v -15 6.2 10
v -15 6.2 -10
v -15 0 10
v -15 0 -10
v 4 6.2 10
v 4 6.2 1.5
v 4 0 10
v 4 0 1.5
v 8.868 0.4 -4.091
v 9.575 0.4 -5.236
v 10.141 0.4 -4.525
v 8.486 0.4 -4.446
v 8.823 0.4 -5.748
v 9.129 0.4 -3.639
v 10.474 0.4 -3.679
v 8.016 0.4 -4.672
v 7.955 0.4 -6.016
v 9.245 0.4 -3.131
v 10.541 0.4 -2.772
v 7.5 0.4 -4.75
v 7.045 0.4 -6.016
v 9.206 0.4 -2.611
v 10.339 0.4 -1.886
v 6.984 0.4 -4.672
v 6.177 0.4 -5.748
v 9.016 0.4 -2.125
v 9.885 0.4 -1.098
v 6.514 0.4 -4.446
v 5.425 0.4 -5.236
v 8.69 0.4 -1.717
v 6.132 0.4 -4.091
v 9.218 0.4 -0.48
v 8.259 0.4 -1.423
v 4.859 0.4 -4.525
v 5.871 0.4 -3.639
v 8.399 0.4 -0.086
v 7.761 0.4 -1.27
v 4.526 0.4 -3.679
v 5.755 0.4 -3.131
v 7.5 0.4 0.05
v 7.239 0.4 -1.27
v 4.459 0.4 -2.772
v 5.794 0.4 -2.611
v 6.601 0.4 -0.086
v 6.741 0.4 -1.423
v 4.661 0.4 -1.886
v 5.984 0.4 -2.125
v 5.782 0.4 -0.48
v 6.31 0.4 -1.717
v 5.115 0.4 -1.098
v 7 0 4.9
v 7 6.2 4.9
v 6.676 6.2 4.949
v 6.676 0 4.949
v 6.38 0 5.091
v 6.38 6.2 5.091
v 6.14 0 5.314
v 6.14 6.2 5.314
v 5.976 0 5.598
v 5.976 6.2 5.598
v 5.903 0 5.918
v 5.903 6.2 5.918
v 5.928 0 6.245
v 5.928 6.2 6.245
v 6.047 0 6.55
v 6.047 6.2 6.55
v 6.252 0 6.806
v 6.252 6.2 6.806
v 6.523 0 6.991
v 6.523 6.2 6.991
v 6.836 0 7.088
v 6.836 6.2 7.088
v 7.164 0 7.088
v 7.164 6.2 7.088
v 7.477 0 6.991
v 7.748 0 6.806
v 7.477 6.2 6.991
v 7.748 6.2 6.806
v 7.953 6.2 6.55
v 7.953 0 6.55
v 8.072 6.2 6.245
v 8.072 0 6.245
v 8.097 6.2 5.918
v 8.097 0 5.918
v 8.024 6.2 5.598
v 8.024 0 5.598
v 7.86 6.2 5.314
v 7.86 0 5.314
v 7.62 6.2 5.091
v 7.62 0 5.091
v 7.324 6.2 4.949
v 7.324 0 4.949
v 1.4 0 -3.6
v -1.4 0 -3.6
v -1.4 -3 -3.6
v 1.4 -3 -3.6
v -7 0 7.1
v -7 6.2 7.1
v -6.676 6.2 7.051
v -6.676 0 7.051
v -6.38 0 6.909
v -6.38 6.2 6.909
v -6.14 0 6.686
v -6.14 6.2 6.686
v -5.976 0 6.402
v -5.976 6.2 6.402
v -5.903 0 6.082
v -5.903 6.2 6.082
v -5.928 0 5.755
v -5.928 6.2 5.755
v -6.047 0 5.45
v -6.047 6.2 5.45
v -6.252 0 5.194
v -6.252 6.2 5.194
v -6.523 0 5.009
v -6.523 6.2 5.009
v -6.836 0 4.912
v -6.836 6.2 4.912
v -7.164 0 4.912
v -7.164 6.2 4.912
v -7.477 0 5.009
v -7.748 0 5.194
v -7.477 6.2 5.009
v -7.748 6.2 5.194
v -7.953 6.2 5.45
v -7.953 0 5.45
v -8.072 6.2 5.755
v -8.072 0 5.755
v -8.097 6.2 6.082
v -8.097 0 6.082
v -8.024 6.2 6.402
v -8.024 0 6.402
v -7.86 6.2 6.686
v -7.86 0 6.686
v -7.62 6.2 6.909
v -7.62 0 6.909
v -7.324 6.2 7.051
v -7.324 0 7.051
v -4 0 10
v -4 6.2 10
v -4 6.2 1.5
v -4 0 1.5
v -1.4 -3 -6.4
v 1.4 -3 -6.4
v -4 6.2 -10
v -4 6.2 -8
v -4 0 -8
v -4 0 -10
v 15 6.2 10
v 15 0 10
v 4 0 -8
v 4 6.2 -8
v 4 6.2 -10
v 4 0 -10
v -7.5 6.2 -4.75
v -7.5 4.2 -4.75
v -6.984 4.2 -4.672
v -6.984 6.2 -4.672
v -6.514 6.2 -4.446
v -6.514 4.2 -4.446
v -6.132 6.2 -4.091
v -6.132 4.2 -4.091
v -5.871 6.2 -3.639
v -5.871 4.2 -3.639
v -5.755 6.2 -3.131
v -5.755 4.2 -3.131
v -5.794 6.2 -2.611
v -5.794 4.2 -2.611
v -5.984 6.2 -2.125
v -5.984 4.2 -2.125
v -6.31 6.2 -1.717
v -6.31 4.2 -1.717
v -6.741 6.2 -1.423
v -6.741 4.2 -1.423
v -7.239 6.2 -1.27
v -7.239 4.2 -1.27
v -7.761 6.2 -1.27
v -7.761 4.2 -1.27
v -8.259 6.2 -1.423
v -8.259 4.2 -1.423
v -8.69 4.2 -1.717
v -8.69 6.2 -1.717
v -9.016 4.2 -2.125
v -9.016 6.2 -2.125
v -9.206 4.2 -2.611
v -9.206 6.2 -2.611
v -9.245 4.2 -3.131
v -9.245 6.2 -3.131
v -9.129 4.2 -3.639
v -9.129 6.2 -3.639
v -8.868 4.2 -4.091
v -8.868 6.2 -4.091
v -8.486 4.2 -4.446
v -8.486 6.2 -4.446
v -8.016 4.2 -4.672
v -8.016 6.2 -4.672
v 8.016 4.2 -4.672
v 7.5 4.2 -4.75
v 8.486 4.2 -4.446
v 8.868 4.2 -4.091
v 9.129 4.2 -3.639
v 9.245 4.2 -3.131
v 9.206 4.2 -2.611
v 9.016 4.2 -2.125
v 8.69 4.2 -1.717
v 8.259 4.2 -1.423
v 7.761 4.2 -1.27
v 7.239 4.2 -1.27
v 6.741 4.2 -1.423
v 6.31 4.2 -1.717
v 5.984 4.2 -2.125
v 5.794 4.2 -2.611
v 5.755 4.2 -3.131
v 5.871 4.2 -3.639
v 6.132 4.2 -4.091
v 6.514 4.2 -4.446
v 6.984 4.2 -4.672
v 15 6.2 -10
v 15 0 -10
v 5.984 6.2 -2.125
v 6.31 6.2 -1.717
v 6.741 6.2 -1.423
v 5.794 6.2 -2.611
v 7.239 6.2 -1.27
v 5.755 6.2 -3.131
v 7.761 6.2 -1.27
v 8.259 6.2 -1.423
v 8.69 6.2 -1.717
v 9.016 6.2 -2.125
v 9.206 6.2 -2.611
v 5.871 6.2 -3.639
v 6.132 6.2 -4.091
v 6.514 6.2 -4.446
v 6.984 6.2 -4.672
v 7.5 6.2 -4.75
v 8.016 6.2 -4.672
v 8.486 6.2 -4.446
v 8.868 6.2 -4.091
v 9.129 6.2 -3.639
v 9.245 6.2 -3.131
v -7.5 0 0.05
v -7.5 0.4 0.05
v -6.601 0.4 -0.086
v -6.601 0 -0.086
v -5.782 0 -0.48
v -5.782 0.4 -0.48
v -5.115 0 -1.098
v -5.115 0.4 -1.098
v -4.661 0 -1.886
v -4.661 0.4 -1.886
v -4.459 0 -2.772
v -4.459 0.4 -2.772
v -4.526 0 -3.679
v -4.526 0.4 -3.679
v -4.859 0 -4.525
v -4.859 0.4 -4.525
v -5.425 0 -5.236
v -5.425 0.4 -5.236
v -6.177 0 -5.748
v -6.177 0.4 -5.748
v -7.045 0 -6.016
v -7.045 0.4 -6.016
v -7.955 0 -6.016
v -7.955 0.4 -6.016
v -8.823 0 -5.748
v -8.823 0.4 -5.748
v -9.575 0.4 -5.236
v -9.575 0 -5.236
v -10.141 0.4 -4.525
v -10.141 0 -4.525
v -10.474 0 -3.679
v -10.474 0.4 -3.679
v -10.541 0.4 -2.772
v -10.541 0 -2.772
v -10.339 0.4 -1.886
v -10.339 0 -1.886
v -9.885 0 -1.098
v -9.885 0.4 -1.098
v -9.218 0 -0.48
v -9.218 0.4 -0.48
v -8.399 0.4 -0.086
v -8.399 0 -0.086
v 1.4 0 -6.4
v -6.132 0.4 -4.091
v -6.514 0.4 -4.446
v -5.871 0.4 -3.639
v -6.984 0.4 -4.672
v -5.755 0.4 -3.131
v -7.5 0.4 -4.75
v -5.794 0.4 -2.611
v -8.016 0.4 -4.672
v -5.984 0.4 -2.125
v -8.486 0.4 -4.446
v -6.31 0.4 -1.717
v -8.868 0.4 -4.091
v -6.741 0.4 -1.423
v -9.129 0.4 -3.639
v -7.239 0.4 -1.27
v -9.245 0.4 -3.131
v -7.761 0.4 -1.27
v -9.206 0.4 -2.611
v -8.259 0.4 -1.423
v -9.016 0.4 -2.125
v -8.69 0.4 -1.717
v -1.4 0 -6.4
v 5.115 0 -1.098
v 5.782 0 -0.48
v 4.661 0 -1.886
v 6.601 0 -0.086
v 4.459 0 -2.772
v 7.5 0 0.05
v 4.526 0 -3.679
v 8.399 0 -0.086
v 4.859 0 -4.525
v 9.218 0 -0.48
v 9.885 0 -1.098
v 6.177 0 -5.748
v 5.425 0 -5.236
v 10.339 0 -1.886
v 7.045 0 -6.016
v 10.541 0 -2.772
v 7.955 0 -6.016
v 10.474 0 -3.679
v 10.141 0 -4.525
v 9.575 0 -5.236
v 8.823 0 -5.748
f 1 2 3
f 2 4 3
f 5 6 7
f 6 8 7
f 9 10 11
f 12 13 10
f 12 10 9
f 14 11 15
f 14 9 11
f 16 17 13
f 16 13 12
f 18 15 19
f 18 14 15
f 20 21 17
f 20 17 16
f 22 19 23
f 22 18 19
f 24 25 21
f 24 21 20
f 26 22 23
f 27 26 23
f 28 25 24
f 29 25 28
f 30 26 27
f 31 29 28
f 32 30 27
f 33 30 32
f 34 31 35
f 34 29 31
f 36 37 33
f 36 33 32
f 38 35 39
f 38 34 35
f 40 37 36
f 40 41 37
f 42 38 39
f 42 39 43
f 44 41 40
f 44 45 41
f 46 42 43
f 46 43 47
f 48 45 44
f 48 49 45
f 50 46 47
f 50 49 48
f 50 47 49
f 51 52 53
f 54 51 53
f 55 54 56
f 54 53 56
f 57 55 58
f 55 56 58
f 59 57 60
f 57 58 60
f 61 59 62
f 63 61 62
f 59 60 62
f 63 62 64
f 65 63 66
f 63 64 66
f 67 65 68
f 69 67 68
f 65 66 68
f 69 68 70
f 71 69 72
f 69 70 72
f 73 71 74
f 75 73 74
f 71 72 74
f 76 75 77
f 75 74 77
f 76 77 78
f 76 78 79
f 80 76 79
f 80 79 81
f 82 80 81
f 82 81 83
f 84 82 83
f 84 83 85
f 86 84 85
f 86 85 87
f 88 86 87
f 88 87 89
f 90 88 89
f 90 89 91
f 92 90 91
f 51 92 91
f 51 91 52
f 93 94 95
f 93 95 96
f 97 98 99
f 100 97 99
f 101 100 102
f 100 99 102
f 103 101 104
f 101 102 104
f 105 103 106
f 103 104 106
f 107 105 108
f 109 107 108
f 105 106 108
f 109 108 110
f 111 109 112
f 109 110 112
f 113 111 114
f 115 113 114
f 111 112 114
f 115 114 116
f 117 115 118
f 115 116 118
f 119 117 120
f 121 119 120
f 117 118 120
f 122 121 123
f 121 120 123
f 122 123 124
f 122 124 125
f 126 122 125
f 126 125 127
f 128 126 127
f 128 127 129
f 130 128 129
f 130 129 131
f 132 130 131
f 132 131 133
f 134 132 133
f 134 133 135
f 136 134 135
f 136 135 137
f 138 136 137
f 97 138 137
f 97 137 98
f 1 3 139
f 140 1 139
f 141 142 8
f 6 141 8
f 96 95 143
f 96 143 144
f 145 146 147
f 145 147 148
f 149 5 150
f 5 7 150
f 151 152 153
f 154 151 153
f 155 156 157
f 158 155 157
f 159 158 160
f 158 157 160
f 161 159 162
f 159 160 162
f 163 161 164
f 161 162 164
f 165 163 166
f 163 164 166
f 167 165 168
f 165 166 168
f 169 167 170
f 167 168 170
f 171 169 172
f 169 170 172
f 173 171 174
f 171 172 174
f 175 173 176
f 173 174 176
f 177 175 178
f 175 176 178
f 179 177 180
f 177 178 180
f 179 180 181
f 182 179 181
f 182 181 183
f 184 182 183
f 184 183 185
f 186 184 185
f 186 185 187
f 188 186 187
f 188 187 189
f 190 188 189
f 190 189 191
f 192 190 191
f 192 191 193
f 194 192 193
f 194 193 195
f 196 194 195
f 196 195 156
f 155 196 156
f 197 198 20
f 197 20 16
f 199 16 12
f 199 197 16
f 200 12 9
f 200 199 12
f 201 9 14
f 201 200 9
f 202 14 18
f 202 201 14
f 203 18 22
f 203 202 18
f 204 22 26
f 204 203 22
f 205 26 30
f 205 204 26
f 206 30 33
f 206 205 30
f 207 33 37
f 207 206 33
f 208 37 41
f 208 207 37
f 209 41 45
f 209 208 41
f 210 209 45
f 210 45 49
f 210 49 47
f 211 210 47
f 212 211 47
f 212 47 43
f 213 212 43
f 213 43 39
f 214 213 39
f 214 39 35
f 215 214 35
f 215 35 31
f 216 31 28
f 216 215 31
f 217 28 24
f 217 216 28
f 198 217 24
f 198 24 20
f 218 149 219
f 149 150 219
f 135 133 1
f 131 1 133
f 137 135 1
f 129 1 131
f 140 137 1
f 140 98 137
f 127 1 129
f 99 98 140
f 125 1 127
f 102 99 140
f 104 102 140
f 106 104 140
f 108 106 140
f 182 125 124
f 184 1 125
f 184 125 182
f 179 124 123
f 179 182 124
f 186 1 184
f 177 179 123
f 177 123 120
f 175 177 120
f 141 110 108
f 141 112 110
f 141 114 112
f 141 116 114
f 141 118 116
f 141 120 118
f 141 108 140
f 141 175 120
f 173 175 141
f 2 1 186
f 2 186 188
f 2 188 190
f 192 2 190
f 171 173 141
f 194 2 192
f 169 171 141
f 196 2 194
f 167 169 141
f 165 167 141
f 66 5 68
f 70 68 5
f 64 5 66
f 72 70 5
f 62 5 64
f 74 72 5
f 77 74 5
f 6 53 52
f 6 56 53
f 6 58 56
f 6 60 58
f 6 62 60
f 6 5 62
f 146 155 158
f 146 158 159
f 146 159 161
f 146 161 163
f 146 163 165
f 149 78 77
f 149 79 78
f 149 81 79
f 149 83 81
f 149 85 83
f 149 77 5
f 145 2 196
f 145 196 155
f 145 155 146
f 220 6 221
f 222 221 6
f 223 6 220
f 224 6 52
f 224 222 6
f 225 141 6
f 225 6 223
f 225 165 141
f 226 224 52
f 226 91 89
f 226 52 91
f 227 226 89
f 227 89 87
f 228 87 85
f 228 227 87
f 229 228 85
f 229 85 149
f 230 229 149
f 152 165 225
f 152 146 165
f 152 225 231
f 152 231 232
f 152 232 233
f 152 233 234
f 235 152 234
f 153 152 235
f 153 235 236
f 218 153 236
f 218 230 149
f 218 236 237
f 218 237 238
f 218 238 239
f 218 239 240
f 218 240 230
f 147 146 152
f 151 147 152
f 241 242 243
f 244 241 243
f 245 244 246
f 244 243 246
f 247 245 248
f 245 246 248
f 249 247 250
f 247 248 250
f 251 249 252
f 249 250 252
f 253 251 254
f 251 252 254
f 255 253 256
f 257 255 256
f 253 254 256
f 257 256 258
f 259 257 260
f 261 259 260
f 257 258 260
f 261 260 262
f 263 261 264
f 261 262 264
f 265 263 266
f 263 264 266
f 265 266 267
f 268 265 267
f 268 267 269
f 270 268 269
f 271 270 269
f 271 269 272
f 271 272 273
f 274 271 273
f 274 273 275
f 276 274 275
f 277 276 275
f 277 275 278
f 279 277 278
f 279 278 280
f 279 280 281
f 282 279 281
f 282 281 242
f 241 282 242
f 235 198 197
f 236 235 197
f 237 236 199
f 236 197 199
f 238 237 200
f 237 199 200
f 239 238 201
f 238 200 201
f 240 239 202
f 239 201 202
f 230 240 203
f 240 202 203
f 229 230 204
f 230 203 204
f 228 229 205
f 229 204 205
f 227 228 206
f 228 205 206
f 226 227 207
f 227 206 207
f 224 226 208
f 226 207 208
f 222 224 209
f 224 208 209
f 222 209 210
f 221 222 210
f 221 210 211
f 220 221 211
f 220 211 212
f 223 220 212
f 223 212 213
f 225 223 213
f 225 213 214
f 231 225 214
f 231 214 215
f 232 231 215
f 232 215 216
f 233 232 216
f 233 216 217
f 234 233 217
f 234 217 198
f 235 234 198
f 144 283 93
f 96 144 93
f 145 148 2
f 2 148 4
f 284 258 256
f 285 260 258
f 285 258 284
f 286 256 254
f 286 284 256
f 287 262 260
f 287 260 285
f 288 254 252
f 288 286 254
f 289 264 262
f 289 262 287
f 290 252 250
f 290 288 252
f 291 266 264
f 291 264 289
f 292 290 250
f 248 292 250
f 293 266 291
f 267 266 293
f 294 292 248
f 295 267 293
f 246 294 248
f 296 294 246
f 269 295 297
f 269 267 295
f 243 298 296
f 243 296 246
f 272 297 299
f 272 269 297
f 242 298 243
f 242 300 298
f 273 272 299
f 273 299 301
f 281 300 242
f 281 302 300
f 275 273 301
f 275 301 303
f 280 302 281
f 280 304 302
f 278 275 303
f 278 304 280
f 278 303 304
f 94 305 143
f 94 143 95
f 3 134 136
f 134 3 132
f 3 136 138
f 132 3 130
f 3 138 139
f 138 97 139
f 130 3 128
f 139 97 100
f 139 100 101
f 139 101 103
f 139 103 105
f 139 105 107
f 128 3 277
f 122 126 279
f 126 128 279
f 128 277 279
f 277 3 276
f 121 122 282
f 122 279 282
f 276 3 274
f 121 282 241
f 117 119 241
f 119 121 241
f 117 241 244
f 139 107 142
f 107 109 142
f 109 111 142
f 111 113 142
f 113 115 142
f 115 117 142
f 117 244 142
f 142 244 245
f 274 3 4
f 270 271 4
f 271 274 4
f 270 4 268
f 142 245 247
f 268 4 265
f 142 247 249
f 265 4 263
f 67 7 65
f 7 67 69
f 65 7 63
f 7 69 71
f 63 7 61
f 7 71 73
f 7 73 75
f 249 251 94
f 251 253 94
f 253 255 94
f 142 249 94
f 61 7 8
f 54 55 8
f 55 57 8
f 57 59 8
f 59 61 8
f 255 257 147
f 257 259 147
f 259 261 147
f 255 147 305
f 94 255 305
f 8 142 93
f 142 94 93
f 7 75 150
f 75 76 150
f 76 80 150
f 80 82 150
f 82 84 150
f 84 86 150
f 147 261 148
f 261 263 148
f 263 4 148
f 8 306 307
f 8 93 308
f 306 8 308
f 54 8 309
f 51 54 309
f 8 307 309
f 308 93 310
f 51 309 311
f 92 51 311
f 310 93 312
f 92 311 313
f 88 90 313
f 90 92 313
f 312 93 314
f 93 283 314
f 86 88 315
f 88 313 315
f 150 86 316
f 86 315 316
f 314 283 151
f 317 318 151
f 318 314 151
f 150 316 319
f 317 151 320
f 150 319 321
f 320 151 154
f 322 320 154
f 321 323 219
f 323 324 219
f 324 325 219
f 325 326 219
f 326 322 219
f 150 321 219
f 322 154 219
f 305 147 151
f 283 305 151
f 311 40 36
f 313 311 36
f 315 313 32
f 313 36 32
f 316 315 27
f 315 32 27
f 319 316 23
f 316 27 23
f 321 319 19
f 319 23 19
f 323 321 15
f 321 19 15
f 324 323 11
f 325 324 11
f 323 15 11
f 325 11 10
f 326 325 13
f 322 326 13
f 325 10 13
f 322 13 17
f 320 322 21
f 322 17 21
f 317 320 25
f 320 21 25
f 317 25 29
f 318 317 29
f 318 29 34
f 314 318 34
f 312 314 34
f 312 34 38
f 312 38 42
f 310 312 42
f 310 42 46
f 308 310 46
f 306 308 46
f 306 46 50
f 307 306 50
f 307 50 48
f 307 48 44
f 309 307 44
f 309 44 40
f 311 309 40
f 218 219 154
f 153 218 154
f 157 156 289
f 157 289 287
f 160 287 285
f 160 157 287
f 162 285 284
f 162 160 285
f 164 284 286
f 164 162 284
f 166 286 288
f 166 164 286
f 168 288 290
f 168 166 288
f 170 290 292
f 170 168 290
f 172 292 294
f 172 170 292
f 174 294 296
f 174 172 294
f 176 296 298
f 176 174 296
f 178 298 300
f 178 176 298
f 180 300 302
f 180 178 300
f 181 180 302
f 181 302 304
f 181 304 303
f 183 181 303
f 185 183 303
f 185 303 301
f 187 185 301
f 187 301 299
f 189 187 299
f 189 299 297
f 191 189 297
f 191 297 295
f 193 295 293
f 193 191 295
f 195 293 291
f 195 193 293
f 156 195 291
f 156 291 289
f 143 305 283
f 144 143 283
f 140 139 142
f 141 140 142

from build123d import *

# Parameters (mm, degrees)
SKETCH_1_W          = 30
SKETCH_1_H          = 20
EXTRUDE_1_DEPTH     = 4.2
SKETCH_2_R          = 3.05
CUT_EXTRUDE_1_DEPTH = 19.510537539
SKETCH_3_W          = 8
SKETCH_3_H          = 8.5
CUT_EXTRUDE_2_DEPTH = 19.510537539
EXTRUDE_2_DEPTH     = 2
SKETCH_5_R          = 1.75
CUT_EXTRUDE_3_DEPTH = 19.510537539
SKETCH_6_W          = 8
SKETCH_6_H          = 2
CUT_EXTRUDE_4_DEPTH = 20.064102392
SKETCH_7_R          = 1.1
CUT_EXTRUDE_5_DEPTH = 20.064102392
SKETCH_8_W          = 2.8
SKETCH_8_H          = 2.8
EXTRUDE_3_DEPTH     = 3
SKETCH_9_R          = 3.05
SKETCH_9_R_2        = 1.75
EXTRUDE_4_DEPTH     = 3.8


with BuildPart() as part:
    # 草图1 → 凸台-拉伸1 (new body)
    with BuildSketch(Plane(origin=(0, 0, 0), x_dir=(1, 0, 0), z_dir=(0, 1, 0))):
        Rectangle(SKETCH_1_W, SKETCH_1_H)
    extrude(amount=EXTRUDE_1_DEPTH)

    # 草图2 → 切除-拉伸1 (cut, through all)
    with BuildSketch(Plane(origin=(0, 4.2, 0), x_dir=(1, 0, 0), z_dir=(0, 1, 0))):
        with Locations(Location((-7.5, 3, 0), (0, 0, 270))):
            Circle(SKETCH_2_R)
        with Locations(Location((7.5, 3, 0), (0, 0, 270))):
            Circle(SKETCH_2_R)
    extrude(amount=-CUT_EXTRUDE_1_DEPTH, mode=Mode.SUBTRACT)

    # 草图3 → 切除-拉伸2 (cut, through all)
    with BuildSketch(Plane(origin=(0, 4.2, 0), x_dir=(1, 0, 0), z_dir=(0, 1, 0))):
        with Locations((0, -5.75)):
            Rectangle(SKETCH_3_W, SKETCH_3_H)
    extrude(amount=-CUT_EXTRUDE_2_DEPTH, mode=Mode.SUBTRACT)

    # 草图4 → 凸台-拉伸2 (add)
    with BuildSketch(Plane(origin=(0, 4.2, 0), x_dir=(1, 0, 0), z_dir=(0, 1, 0))):
        Polygon((-4, -1.5), (4, -1.5), (4, -10), (15, -10), (15, 10), (-15, 10), (-15, -10), (-4, -10), align=None)
    extrude(amount=EXTRUDE_2_DEPTH)

    # 草图5 → 切除-拉伸3 (cut, through all)
    with BuildSketch(Plane.XZ.offset(-4.2)):
        with Locations(Location((-7.5, -3, 0), (0, 0, 270))):
            Circle(SKETCH_5_R)
        with Locations(Location((7.5, -3, 0), (0, 0, 270))):
            Circle(SKETCH_5_R)
    extrude(amount=-CUT_EXTRUDE_3_DEPTH, mode=Mode.SUBTRACT)

    # 草图6 → 切除-拉伸4 (cut, through all)
    with BuildSketch(Plane(origin=(0, 6.2, 0), x_dir=(1, 0, 0), z_dir=(0, 1, 0))):
        with Locations((0, 9)):
            Rectangle(SKETCH_6_W, SKETCH_6_H)
    extrude(amount=-CUT_EXTRUDE_4_DEPTH, mode=Mode.SUBTRACT)

    # 草图7 → 切除-拉伸5 (cut, through all)
    with BuildSketch(Plane(origin=(0, 6.2, 0), x_dir=(1, 0, 0), z_dir=(0, 1, 0))):
        with Locations(Location((-7, -6, 0), (0, 0, 270))):
            Circle(SKETCH_7_R)
        with Locations(Location((7, -6, 0), (0, 0, 90))):
            Circle(SKETCH_7_R)
    extrude(amount=-CUT_EXTRUDE_5_DEPTH, mode=Mode.SUBTRACT)

    # 草图8 → 凸台-拉伸3 (add)
    with BuildSketch(Plane.XZ):
        with Locations((0, -5)):
            Rectangle(SKETCH_8_W, SKETCH_8_H)
    extrude(amount=EXTRUDE_3_DEPTH)

    # 草图9 → 凸台-拉伸4 (add)
    # profile 1 of 2: a face of its own
    with BuildSketch(Plane.XZ.offset(-4.2)):
        with Locations(Location((7.5, -3, 0), (0, 0, 90))):
            Circle(SKETCH_9_R)
        with Locations(Location((7.5, -3, 0), (0, 0, 270))):
            Circle(SKETCH_9_R_2, mode=Mode.SUBTRACT)
    # profile 2 of 2: a face of its own
    with BuildSketch(Plane.XZ.offset(-4.2)):
        with Locations(Location((-7.5, -3, 0), (0, 0, 90))):
            Circle(SKETCH_9_R)
        with Locations(Location((-7.5, -3, 0), (0, 0, 270))):
            Circle(SKETCH_9_R_2, mode=Mode.SUBTRACT)
    extrude(amount=EXTRUDE_4_DEPTH)


solid = part.part
